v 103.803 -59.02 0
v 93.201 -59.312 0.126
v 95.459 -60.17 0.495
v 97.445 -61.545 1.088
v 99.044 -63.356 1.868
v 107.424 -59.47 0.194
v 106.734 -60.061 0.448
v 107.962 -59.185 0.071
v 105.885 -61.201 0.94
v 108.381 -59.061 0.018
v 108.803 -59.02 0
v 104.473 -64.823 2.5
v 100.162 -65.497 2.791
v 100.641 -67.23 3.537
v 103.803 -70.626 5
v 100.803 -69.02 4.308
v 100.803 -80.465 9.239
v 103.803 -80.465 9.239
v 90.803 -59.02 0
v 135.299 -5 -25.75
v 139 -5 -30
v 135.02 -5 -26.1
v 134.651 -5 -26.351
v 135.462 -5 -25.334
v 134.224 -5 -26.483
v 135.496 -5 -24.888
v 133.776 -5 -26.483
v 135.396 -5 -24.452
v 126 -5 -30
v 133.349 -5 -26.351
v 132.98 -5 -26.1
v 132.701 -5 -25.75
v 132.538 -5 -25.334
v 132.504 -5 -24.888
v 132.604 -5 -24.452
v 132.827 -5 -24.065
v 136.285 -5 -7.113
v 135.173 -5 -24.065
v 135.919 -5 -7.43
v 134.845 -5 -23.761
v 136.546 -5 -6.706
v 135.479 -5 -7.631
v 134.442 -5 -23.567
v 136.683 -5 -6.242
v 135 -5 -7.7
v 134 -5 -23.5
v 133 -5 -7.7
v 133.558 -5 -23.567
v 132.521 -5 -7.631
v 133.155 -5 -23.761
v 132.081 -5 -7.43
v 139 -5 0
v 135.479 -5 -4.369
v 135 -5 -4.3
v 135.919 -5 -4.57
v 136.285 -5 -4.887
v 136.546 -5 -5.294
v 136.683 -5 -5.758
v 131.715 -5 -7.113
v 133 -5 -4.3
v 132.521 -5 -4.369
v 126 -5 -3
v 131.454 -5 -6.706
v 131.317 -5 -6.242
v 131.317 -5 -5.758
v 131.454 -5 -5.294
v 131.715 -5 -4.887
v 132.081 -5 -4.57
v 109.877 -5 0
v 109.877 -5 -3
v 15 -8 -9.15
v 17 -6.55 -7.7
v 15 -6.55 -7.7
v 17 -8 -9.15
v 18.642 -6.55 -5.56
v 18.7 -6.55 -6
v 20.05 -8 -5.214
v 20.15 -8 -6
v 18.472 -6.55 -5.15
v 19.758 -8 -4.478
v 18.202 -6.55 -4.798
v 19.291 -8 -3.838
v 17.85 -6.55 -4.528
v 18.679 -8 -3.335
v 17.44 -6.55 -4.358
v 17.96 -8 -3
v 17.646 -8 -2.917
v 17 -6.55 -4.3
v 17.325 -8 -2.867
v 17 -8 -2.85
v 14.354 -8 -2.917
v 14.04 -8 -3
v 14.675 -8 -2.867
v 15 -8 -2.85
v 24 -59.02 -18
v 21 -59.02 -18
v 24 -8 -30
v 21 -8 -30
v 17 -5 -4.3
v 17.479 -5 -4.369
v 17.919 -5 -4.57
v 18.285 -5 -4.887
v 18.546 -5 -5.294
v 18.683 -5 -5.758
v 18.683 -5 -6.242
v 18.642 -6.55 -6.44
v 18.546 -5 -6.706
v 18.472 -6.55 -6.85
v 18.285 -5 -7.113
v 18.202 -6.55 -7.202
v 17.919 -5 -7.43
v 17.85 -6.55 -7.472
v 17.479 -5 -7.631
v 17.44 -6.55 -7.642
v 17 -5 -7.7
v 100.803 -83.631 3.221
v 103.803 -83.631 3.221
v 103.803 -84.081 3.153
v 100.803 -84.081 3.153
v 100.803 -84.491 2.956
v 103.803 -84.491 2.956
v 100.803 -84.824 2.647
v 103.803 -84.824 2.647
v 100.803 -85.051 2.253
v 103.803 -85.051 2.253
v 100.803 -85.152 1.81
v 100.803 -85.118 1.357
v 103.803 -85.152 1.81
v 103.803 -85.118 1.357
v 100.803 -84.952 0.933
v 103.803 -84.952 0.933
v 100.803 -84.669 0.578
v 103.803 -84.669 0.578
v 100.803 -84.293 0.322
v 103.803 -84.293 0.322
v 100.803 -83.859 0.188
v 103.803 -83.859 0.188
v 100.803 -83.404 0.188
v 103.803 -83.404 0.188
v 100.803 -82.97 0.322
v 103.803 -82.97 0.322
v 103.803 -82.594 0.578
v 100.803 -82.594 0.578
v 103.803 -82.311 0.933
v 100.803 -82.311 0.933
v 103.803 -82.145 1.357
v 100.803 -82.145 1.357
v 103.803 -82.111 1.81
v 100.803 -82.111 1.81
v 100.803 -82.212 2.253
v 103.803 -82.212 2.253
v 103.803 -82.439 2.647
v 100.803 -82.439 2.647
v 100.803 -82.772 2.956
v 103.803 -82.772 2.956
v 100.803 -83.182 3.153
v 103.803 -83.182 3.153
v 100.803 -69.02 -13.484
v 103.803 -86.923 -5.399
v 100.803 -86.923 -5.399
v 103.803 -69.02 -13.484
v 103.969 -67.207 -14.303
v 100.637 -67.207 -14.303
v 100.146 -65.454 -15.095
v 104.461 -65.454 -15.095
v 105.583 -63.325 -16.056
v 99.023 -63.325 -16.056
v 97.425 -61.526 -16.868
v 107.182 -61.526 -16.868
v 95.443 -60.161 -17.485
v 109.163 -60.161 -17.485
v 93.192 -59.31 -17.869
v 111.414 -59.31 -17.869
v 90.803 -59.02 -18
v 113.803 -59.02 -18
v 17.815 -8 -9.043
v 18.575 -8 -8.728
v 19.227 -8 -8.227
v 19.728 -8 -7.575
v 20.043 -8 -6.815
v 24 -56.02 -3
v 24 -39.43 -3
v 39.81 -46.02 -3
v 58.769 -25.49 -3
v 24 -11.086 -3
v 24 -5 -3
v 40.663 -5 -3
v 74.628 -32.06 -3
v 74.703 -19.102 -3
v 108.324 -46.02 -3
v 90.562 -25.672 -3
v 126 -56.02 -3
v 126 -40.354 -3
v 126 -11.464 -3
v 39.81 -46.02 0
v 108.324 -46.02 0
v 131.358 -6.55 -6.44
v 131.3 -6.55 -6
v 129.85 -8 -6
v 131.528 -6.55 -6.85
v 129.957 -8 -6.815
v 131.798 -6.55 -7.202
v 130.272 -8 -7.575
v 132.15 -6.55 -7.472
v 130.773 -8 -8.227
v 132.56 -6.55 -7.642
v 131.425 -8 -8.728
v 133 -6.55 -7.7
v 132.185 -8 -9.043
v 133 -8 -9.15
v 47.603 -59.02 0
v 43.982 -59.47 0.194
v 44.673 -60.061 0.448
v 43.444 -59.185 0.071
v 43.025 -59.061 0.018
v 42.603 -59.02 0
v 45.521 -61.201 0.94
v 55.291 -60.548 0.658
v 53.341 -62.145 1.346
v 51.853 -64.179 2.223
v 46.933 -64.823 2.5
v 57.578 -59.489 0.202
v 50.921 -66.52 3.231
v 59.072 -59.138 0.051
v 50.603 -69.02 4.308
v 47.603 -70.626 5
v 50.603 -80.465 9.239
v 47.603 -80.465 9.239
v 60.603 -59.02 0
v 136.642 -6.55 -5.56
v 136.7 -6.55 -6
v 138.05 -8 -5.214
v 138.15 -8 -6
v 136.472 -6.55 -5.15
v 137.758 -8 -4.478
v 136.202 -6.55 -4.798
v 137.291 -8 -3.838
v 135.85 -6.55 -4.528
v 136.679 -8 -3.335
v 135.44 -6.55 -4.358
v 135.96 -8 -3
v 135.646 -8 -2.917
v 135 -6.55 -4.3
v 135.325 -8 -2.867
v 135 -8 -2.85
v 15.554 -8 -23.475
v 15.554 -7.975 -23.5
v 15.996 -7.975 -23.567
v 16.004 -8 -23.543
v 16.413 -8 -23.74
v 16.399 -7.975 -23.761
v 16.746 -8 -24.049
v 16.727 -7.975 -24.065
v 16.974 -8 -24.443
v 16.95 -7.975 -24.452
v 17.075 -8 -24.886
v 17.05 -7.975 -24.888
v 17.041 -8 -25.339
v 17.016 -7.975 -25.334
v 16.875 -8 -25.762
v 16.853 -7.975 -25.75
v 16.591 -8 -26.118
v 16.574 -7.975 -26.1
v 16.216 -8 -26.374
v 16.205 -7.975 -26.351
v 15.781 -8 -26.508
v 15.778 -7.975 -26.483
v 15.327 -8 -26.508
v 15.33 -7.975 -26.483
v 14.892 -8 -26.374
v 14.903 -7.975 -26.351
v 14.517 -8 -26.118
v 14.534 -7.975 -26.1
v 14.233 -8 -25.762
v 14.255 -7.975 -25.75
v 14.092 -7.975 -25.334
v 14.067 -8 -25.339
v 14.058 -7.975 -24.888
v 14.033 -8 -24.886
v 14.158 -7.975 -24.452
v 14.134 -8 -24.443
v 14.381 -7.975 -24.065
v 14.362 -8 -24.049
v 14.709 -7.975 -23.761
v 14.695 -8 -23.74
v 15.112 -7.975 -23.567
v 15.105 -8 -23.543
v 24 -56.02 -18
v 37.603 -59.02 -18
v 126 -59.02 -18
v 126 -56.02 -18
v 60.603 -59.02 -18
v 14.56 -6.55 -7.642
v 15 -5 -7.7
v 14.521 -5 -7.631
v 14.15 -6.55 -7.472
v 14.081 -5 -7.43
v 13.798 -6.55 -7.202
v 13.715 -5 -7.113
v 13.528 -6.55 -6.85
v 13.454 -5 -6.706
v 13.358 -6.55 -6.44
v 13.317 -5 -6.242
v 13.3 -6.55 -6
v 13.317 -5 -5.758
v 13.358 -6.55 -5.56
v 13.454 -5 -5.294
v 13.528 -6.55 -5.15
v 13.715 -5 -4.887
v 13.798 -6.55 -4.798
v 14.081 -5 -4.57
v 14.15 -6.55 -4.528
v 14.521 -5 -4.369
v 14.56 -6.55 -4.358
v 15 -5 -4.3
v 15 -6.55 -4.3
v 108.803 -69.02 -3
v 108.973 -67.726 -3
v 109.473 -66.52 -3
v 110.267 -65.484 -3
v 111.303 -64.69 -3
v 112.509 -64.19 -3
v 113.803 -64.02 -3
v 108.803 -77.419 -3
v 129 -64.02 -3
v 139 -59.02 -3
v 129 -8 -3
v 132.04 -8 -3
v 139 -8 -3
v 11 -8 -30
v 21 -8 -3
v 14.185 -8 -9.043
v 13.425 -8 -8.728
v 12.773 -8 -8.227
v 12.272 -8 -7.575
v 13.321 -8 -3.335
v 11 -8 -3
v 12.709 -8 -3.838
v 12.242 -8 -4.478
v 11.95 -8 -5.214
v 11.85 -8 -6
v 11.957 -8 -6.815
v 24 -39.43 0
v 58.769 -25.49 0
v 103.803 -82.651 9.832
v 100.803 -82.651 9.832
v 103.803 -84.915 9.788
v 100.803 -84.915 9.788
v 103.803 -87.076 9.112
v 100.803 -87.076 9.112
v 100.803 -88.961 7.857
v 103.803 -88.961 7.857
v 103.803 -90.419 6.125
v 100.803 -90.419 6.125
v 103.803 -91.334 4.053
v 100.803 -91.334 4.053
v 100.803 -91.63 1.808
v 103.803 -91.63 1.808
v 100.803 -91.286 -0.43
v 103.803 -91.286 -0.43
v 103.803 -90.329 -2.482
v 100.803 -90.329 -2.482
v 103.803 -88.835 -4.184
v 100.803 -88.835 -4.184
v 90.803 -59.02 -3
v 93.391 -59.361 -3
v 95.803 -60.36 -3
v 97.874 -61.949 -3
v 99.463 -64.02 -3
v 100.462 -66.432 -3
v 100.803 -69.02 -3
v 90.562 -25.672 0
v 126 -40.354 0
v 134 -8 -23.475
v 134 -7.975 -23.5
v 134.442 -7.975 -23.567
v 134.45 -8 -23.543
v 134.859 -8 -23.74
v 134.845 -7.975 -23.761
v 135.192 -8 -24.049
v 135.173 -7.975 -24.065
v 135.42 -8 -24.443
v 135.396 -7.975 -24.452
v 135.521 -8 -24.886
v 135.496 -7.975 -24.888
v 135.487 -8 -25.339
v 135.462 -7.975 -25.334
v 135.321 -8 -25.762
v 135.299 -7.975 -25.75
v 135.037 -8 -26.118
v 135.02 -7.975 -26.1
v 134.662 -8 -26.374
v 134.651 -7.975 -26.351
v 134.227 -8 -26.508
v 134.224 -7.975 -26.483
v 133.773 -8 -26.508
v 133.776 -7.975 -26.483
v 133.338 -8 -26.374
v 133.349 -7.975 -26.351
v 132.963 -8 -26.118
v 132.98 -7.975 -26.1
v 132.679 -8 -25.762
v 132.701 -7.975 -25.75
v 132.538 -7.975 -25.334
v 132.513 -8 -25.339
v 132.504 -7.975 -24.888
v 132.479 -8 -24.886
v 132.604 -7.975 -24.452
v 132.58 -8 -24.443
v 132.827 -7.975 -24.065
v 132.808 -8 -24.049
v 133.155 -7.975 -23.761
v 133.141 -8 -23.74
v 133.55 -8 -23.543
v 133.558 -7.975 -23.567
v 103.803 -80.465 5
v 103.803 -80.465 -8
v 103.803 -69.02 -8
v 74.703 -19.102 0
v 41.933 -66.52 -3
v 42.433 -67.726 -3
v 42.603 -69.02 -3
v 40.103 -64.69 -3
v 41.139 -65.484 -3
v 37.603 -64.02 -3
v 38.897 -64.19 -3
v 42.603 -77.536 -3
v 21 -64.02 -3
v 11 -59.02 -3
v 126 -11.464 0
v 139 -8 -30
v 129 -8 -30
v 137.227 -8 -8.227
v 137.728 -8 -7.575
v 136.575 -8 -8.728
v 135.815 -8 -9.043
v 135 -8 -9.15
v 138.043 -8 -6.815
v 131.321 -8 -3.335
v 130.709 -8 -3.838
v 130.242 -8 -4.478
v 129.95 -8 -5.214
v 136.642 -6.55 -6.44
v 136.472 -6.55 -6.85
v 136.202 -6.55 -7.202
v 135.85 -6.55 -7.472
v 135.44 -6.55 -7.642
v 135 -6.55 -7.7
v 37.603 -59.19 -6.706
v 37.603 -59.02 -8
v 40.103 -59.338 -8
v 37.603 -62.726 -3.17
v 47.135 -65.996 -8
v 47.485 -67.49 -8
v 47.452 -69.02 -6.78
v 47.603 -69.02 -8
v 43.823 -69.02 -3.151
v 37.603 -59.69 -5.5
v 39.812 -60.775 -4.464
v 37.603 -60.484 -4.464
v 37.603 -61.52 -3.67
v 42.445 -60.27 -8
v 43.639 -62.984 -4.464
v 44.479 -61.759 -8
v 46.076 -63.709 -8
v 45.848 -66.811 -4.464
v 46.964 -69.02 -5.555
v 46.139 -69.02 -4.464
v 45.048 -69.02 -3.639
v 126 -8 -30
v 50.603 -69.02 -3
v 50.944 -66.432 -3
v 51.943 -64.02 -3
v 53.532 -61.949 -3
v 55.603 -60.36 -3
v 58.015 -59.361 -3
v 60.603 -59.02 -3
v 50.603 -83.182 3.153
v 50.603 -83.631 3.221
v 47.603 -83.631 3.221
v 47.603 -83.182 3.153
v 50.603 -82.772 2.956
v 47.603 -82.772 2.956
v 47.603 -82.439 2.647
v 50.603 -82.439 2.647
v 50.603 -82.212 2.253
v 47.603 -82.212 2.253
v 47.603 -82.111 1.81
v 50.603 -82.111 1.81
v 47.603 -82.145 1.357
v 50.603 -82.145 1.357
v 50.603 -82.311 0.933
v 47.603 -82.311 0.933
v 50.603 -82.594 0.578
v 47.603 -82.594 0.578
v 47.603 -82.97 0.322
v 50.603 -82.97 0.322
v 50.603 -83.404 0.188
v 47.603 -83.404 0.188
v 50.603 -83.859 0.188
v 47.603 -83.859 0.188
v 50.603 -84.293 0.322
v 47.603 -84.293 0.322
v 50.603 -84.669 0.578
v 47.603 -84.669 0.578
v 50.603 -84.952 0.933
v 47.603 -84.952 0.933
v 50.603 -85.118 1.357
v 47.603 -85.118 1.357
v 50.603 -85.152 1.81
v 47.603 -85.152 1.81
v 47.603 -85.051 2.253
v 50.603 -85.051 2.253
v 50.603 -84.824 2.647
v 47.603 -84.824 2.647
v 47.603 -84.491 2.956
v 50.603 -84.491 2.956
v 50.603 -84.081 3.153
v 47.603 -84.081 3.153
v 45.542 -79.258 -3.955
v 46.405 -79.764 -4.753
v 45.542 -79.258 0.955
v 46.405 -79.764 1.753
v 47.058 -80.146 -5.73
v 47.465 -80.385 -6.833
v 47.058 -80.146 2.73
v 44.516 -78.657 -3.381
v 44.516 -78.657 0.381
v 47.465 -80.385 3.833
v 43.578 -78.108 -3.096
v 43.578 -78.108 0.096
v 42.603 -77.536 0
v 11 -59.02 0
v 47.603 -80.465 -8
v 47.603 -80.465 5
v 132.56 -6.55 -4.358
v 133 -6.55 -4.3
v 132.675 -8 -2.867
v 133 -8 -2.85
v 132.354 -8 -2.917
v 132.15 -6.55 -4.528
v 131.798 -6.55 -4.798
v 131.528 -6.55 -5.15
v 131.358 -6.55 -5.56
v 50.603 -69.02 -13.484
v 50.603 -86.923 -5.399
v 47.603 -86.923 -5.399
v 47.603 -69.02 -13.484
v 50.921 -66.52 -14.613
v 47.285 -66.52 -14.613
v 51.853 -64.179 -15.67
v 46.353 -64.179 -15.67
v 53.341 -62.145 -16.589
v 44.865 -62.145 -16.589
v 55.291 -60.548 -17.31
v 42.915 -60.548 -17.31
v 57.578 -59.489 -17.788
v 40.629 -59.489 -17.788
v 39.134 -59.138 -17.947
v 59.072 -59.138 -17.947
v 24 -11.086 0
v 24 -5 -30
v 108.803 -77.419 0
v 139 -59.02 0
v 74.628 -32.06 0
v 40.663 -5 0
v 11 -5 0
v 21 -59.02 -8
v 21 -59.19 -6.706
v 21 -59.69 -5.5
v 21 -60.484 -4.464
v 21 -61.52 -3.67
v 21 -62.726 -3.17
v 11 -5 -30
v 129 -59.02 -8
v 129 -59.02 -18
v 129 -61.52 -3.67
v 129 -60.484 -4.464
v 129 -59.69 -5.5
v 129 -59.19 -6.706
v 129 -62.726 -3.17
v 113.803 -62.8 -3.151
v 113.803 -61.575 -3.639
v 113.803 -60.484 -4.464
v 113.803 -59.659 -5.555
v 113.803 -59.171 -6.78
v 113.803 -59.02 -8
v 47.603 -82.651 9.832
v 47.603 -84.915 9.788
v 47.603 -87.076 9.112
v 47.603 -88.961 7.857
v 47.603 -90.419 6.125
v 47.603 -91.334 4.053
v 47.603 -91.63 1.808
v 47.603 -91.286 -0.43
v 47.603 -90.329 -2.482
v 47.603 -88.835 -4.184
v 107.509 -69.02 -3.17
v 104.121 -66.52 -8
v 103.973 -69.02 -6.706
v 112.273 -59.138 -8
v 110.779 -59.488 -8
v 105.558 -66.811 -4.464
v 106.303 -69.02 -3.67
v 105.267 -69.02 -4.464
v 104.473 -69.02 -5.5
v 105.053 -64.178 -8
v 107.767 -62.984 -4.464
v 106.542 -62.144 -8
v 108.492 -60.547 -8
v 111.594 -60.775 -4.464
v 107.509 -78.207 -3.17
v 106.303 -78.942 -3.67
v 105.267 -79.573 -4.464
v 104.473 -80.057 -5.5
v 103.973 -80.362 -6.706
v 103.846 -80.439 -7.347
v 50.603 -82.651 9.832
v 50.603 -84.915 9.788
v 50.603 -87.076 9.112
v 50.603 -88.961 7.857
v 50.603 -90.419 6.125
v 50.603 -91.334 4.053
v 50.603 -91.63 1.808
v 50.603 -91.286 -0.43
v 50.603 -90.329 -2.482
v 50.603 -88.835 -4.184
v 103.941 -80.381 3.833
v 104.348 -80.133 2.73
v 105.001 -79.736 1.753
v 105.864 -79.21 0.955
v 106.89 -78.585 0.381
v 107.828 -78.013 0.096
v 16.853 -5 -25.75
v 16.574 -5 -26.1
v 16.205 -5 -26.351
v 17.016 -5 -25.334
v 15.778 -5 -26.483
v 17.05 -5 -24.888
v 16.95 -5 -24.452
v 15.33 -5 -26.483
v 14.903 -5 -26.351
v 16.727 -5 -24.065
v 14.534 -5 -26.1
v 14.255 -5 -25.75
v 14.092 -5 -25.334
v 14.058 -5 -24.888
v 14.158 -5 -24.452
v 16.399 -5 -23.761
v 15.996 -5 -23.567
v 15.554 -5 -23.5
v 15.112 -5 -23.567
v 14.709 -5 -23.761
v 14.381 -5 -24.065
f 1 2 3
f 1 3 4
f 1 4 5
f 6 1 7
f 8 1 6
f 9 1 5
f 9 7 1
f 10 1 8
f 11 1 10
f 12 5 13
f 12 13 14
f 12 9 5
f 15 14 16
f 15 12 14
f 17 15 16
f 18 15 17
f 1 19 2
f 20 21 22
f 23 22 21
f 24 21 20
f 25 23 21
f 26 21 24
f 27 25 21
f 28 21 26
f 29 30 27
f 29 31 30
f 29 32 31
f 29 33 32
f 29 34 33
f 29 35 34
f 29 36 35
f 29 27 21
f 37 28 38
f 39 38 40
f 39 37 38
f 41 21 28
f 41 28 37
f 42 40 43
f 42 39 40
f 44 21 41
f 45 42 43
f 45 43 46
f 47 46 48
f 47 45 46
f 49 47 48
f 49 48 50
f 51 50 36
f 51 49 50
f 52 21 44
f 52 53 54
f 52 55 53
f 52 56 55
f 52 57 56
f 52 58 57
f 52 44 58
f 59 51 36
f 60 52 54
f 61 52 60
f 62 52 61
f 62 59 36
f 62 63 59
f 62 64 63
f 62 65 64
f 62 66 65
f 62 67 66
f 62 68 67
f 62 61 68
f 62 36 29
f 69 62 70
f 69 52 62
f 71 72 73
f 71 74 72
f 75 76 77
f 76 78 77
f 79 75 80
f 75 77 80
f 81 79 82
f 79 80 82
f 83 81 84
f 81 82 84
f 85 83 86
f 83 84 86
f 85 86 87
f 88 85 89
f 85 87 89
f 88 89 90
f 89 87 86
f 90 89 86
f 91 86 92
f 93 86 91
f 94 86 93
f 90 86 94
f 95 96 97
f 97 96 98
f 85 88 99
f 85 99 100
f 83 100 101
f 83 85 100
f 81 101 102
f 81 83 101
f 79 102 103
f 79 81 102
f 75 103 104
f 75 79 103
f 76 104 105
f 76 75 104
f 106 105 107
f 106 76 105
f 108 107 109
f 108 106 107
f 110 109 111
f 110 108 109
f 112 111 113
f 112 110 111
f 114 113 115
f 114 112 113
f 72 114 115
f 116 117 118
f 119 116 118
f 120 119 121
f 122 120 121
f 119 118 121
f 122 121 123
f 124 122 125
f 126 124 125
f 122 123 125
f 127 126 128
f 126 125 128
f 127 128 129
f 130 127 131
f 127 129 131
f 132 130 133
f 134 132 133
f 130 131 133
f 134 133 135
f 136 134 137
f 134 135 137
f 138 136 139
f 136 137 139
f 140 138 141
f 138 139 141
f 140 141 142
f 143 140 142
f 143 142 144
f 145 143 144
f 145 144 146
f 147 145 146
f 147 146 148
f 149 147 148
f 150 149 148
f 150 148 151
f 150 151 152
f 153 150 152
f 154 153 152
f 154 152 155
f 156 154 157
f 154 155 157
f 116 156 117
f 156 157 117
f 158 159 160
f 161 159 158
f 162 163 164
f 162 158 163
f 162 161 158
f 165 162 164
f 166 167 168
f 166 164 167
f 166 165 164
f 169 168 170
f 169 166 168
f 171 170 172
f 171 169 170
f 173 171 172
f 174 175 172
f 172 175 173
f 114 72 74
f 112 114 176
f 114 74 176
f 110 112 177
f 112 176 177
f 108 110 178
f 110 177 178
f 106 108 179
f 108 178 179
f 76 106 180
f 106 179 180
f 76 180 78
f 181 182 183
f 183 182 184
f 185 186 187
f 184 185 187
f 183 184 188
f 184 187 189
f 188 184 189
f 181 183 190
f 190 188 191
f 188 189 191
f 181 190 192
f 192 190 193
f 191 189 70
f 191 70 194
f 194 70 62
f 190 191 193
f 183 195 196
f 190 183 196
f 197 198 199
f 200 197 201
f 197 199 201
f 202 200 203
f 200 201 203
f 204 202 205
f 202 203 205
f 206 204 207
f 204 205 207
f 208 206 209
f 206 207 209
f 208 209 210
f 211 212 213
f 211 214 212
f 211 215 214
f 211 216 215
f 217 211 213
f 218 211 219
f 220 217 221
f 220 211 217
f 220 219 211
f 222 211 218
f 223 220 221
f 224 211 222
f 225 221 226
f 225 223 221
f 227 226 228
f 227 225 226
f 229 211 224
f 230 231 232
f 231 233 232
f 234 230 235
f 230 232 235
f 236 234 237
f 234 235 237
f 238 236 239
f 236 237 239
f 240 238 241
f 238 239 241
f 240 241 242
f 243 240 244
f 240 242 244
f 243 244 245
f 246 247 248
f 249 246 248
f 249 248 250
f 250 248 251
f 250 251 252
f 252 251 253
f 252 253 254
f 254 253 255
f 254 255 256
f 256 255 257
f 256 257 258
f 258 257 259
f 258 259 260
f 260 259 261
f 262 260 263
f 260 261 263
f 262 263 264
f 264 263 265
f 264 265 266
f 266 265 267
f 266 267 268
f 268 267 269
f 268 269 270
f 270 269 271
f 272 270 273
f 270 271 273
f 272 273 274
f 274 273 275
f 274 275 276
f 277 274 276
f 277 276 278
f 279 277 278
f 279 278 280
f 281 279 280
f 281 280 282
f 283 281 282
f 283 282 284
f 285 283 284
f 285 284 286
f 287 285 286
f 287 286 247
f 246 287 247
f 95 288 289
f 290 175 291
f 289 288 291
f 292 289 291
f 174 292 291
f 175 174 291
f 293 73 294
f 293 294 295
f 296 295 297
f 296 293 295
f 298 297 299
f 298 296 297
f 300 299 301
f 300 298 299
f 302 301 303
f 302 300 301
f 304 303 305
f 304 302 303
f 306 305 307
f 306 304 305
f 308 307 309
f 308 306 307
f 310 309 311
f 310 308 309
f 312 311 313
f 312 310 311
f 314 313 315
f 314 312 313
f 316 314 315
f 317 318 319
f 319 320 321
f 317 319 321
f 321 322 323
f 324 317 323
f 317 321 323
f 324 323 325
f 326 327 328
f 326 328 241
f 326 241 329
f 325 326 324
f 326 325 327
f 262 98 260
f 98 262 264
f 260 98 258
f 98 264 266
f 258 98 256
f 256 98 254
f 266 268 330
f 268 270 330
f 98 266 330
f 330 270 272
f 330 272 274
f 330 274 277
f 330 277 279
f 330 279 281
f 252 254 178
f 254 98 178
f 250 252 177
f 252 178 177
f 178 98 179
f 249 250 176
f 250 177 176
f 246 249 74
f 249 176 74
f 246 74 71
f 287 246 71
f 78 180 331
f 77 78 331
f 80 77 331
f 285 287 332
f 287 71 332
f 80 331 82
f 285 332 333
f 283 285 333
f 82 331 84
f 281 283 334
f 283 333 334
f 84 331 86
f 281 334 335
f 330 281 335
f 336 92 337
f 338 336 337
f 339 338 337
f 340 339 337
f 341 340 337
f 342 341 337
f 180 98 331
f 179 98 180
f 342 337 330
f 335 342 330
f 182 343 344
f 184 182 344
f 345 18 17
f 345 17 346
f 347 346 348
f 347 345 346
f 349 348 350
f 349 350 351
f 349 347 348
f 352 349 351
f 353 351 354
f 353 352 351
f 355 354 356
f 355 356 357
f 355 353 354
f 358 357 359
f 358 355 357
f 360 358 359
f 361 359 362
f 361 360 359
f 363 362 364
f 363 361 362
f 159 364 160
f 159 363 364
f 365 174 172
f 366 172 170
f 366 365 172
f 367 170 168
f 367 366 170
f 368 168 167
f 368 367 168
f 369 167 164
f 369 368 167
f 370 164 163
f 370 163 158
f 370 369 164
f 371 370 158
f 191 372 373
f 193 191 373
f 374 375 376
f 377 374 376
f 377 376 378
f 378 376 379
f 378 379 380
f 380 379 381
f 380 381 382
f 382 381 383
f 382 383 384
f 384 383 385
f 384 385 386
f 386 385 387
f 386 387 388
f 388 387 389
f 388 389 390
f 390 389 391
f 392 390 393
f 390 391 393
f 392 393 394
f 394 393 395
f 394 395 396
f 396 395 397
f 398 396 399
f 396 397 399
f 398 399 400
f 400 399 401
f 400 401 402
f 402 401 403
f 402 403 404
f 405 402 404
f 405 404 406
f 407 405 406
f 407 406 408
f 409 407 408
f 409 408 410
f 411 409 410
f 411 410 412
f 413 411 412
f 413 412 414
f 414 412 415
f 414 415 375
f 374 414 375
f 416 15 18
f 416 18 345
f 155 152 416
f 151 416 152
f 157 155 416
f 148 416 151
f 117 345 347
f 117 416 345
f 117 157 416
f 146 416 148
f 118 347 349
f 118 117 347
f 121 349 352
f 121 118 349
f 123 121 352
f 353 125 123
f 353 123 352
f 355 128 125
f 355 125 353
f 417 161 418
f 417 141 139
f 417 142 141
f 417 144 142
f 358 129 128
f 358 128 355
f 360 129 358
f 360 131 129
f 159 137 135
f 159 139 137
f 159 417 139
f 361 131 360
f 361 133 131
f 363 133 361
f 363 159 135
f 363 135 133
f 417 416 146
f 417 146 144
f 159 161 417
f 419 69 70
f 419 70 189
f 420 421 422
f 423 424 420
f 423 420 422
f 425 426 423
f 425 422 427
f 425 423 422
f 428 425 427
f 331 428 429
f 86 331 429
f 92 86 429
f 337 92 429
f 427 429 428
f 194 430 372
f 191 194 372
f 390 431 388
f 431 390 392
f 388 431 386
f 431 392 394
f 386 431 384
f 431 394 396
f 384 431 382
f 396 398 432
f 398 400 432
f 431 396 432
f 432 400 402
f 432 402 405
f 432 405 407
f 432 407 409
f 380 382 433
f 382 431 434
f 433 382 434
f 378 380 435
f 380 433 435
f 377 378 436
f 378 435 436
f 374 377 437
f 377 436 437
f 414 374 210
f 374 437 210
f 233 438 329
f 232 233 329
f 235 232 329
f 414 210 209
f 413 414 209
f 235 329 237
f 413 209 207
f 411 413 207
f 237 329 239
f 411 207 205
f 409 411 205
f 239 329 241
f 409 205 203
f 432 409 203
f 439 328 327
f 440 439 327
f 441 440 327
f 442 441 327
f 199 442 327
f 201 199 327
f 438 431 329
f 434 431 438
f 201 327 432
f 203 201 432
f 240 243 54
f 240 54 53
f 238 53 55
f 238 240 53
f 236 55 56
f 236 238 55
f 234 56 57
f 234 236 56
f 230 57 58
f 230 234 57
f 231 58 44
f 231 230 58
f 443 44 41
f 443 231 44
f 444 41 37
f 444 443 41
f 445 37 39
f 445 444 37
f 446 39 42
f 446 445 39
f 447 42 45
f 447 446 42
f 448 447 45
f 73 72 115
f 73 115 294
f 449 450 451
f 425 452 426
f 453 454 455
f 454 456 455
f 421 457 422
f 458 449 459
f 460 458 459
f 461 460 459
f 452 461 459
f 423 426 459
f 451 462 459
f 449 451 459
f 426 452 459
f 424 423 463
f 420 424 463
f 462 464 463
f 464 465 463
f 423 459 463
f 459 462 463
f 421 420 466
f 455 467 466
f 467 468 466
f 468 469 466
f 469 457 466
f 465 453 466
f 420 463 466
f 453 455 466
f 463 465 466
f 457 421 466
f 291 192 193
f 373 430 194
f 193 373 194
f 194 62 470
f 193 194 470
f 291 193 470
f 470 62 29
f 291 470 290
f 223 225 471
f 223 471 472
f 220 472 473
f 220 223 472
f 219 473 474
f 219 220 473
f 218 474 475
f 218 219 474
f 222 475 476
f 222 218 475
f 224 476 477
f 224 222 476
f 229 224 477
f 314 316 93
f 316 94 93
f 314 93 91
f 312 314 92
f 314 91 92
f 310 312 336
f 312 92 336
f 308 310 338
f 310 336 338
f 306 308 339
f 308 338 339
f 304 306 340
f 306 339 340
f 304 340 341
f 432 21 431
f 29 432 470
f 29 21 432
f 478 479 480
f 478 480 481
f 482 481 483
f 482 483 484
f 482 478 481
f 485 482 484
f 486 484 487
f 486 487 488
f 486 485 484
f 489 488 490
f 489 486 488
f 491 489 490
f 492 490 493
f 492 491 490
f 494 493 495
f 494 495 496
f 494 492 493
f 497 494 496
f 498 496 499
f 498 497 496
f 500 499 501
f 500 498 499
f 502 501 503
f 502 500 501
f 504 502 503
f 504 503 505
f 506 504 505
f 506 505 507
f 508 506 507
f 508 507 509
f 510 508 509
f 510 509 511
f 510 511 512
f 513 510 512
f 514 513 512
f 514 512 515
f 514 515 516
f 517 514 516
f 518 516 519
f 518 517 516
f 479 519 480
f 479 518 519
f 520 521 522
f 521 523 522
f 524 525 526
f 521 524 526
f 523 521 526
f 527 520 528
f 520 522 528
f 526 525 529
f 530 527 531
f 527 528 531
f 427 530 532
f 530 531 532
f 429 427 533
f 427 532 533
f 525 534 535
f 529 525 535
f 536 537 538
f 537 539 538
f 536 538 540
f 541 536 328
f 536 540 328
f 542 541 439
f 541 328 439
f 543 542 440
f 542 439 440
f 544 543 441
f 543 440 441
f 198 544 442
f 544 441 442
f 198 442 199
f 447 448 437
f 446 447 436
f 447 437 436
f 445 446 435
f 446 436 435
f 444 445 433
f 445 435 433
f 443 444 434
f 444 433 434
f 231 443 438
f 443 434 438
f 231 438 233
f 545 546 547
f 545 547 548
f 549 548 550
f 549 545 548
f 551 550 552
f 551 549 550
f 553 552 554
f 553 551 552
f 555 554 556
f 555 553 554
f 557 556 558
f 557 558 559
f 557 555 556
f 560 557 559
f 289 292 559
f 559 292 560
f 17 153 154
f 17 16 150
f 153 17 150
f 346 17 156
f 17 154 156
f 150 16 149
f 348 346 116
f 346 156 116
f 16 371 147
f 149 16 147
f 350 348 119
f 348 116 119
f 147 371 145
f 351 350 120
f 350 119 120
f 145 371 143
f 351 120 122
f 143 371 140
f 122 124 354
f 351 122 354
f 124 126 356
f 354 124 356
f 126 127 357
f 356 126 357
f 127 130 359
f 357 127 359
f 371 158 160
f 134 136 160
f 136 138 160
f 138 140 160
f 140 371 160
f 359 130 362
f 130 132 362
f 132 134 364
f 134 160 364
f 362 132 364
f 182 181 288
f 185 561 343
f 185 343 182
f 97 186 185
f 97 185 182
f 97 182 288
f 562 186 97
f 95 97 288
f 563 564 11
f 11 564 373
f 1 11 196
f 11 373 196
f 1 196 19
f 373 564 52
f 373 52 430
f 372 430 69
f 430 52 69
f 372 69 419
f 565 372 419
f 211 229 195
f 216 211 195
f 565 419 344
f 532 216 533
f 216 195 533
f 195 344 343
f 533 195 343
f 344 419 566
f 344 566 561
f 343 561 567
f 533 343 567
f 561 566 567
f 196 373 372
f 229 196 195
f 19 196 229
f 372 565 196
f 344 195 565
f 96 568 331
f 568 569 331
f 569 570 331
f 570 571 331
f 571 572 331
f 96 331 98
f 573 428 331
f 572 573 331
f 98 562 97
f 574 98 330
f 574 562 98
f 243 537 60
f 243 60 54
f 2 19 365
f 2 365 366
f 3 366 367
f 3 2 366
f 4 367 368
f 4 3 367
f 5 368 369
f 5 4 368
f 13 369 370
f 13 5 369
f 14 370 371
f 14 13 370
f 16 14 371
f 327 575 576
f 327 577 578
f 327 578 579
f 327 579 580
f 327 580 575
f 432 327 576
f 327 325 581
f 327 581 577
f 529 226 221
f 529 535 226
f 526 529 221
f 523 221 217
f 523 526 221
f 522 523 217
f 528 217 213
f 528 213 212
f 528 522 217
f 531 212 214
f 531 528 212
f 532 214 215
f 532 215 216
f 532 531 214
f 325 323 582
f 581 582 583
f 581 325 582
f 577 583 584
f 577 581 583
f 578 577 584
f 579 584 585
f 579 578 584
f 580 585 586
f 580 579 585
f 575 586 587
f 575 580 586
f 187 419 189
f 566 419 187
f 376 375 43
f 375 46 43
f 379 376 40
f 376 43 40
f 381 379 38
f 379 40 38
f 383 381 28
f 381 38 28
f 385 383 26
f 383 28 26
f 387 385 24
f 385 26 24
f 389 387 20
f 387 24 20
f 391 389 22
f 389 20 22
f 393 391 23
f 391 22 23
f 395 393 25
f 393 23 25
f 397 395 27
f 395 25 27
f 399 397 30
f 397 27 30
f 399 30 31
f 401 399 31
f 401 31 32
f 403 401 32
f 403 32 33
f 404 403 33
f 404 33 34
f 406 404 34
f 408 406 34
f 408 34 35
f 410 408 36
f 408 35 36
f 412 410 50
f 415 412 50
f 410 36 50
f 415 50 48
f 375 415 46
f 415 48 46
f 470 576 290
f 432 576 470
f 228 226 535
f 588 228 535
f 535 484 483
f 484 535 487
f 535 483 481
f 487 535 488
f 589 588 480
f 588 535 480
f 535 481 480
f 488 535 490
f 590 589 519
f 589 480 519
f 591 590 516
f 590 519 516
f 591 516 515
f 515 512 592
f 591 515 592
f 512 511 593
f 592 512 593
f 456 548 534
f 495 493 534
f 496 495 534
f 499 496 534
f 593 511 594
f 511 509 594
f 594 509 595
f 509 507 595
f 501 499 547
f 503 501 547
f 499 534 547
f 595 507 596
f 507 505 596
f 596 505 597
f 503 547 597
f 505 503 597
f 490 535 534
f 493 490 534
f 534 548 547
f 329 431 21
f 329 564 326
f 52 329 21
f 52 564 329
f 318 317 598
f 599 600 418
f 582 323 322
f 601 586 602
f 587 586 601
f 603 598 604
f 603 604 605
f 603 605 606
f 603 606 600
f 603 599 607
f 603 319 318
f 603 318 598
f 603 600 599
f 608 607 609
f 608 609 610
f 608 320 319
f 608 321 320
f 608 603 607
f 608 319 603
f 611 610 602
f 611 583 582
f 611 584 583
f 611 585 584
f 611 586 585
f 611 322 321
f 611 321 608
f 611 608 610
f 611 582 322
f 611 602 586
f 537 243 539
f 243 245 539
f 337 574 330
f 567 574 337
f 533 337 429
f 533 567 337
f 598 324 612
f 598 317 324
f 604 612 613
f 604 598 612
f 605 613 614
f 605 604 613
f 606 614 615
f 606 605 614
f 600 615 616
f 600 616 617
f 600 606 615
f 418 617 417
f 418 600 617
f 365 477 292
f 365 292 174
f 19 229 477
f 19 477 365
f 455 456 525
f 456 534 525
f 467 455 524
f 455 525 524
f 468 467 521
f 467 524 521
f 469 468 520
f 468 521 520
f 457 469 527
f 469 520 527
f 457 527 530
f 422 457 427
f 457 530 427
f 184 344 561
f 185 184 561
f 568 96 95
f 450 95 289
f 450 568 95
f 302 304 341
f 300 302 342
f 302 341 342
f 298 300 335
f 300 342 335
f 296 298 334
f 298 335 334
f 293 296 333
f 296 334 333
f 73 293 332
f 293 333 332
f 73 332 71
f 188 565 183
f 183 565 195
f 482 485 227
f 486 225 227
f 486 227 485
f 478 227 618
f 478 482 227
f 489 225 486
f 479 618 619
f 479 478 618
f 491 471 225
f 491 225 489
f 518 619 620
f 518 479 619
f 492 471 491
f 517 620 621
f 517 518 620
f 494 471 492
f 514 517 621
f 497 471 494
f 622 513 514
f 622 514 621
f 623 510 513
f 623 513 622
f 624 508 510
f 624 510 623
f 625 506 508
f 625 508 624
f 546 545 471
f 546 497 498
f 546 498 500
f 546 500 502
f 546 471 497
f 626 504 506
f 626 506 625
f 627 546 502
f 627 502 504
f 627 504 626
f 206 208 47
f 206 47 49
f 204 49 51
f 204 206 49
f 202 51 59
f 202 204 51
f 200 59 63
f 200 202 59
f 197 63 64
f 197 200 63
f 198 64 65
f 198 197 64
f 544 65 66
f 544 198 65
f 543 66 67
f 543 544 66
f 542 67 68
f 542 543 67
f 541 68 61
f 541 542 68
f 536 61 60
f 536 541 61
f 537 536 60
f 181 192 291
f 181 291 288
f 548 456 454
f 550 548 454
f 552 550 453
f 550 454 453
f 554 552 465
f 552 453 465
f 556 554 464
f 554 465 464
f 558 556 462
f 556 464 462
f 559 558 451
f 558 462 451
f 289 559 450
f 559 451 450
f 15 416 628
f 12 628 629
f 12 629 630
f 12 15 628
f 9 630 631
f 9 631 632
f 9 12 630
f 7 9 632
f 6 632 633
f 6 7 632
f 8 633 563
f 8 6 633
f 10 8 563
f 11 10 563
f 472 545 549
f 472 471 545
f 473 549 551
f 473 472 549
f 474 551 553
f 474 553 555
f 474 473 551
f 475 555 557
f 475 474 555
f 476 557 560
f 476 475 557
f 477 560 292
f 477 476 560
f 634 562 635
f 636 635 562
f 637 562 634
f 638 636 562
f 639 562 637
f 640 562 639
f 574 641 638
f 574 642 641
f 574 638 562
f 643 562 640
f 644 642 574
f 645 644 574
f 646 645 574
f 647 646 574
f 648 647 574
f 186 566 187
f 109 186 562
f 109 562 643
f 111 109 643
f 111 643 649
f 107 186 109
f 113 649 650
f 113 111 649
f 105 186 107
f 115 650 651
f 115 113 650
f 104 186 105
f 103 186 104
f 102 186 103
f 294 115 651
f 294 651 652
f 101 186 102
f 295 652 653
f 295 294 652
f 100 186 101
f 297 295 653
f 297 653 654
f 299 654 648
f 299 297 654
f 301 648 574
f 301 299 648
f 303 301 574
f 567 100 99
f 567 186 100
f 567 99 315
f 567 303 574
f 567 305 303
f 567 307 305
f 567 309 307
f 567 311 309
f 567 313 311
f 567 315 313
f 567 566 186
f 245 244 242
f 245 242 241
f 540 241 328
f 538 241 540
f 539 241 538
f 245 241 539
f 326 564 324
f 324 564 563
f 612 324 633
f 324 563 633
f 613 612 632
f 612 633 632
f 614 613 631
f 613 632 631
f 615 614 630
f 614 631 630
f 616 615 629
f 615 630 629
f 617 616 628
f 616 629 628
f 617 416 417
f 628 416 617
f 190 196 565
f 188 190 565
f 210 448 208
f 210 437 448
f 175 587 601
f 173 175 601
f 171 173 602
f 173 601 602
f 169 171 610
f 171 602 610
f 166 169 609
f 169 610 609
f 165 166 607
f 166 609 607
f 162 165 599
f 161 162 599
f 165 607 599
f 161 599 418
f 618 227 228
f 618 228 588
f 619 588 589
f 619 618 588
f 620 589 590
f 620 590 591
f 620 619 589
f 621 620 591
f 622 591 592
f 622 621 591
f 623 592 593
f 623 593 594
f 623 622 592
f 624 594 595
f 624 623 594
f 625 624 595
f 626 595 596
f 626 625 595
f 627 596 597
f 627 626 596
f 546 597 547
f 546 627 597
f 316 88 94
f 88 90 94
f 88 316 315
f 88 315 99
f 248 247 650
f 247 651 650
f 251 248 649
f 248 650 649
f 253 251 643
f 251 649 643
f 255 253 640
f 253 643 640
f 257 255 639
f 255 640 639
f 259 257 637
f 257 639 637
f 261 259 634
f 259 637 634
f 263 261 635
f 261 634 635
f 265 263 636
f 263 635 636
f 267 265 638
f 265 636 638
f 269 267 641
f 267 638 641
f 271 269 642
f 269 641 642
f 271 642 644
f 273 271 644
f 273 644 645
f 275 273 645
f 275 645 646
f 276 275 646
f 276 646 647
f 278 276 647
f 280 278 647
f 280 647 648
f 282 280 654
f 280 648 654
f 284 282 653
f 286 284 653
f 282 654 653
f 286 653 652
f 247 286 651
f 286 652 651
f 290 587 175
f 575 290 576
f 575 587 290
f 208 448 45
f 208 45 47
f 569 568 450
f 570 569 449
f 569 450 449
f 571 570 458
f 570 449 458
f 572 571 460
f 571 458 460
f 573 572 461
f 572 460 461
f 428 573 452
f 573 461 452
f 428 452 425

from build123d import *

# Parameters (mm, degrees)
BOSS_EXTRUDE1_DEPTH                            = 3
BOSS_EXTRUDE2_DEPTH                            = 15
SKETCH4_W                                      = 13
SKETCH4_H                                      = 3
BOSS_EXTRUDE3_DEPTH                            = 12
BOSS_EXTRUDE4_DEPTH                            = 3
BOSS_EXTRUDE5_DEPTH                            = 3
SKETCH7_R                                      = 1.525
BOSS_EXTRUDE6_DEPTH                            = 3
BOSS_EXTRUDE7_START                            = 3
SKETCH8_R                                      = 1.525
BOSS_EXTRUDE7_DEPTH                            = 3
BOSS_EXTRUDE8_DEPTH                            = 3
FILLET2_R                                      = 10
FILLET3_R                                      = 5
CSK_START                                      = -8
CSK_SLOT_FOR_M3_FLAT_HEAD_MACHINE_SCREW1_DEPTH = 3
F_3_0MM_DOWEL_HOLE2_D                          = 3
F_3_0MM_DOWEL_HOLE2_DEPTH                      = 7.5
F_3_0MM_DOWEL_HOLE2_CSINK_D                    = 3.05
F_3_0MM_DOWEL_HOLE2_CSINK_ANGLE                = 90
F_3_0MM_DOWEL_HOLE2_TIP                        = 0.901290929


with BuildPart() as part:
    # Sketch1 → Boss-Extrude1 (new body)
    with BuildSketch(Plane.XY):
        Polygon((139, -5), (109.876604516, -5), (74.70251528, -19.102143128), (40.663008058, -5), (11, -5), (11, -59.019998994), (139, -59.019998994), align=None)
        Polygon((126, -11.464259225), (90.561608439, -25.672367549), (126, -40.354051004), align=None, mode=Mode.SUBTRACT)
        Polygon((24, -11.085769738), (24, -39.430007843), (58.769174389, -25.49020487), align=None, mode=Mode.SUBTRACT)
        Polygon((39.809790244, -46.019998994), (108.323633524, -46.019998994), (74.628267548, -32.06042929), align=None, mode=Mode.SUBTRACT)
    extrude(amount=-BOSS_EXTRUDE1_DEPTH)

    # Sketch3 → Boss-Extrude2 (add)
    with BuildSketch(Plane(origin=(0, 0, -3), x_dir=(-1, 0, 0), z_dir=(0, 0, -1))):
        Polygon((-139, -8), (-139, -5), (-126, -5), (-126, -56.019998994), (-24, -56.019998994), (-24, -5), (-11, -5), (-11, -8), (-21, -8), (-21, -59.019998994), (-129, -59.019998994), (-129, -8), align=None)
    extrude(amount=BOSS_EXTRUDE2_DEPTH)

    # Sketch4 → Boss-Extrude3 (add)
    with BuildSketch(Plane(origin=(0, 0, -18), x_dir=(-1, 0, 0), z_dir=(0, 0, -1))):
        with Locations((-132.5, -6.5)):
            Rectangle(SKETCH4_W, SKETCH4_H)
        with Locations((-17.5, -6.5)):
            Rectangle(SKETCH4_W, SKETCH4_H)
    extrude(amount=BOSS_EXTRUDE3_DEPTH)

    # Sketch5 → Boss-Extrude4 (add)
    with BuildSketch(Plane.ZY.offset(-21)):
        Polygon((-30, -8), (-18, -8), (-18, -59.019998994), align=None)
    extrude(amount=-BOSS_EXTRUDE4_DEPTH)

    # Sketch6 → Boss-Extrude5 (add)
    with BuildSketch(Plane(origin=(129, 0, 0), x_dir=(0, 0, -1), z_dir=(1, 0, 0))):
        Polygon((18, -8), (18, -59.019998994), (30, -8), align=None)
    extrude(amount=-BOSS_EXTRUDE5_DEPTH)

    # Sketch7 → Boss-Extrude6 (add)
    with BuildSketch(Plane(origin=(50.603026188, 28.677278628, 20.937913876), x_dir=(0, 0.9992078437352027, -0.039795540177848664), z_dir=(-1, 0, 0))):
        with BuildLine():
            Line((-86.078252358, 42.397029499), (-86.675185461, 27.408911843))
            Line((-86.675185461, 27.408911843), (-86.794572081, 24.411288312))
            Line((-86.794572081, 24.411288312), (-108.590752447, 16.032710832))
            ThreePointArc((-108.590752447, 16.032710832), (-118.903275809, 20.564727028), (-114.461076578, 30.916257103))
            Line((-114.461076578, 30.916257103), (-86.078252358, 42.397029499))
        make_face()
        with Locations(Location((-111.454014111, 23.696060126, 0), (0, 0, 267.719281244))):
            Circle(SKETCH7_R, mode=Mode.SUBTRACT)
    extrude(amount=BOSS_EXTRUDE6_DEPTH)

    # Sketch8 → Boss-Extrude7 (add)
    with BuildSketch(Plane(origin=(100.803026188, 28.677278628, 20.937913876), x_dir=(0, -0.9992078437352027, 0.039795540177848664), z_dir=(1, 0, 0)).offset(BOSS_EXTRUDE7_START)):
        with BuildLine():
            Line((86.078252358, 42.397029499), (86.675185461, 27.408911843))
            Line((86.675185461, 27.408911843), (86.794572081, 24.411288312))
            Line((86.794572081, 24.411288312), (108.590752447, 16.032710832))
            ThreePointArc((108.590752447, 16.032710832), (118.903275809, 20.564727028), (114.461076578, 30.916257103))
            Line((114.461076578, 30.916257103), (86.078252358, 42.397029499))
        make_face()
        with Locations(Location((111.454014111, 23.696060126, 0), (0, 0, 272.280718756))):
            Circle(SKETCH8_R, mode=Mode.SUBTRACT)
    extrude(amount=-BOSS_EXTRUDE7_DEPTH)

    # Sketch9 → Boss-Extrude8 (add)
    with BuildSketch(Plane.XY):
        Polygon((11, -59.019998994), (47.603026188, -59.019998994), (47.603026188, -80.465483362), align=None)
        Polygon((103.803026188, -59.019998994), (139, -59.019998994), (103.803026188, -80.465483362), align=None)
    extrude(amount=-BOSS_EXTRUDE8_DEPTH)

    # Fillet2
    fillet2_edges = [part.edges().sort_by_distance(p)[0] for p in [
        (50.603026188, -59.019998994, -9),
        (103.803026188, -59.019998994, -10.5),
        (100.803026188, -59.019998994, -9),
        (47.603026188, -59.019998994, -10.5),
    ]]
    fillet(fillet2_edges, radius=FILLET2_R)

    # Fillet3
    fillet3_edges = [part.edges().sort_by_distance(p)[0] for p in [
        (47.603026188, -69.742741178, 0),
        (29.301513094, -59.019998994, -3),
        (103.803026188, -69.742741178, 0),
        (103.803026188, -74.742741178, -3),
        (121.401513094, -59.019998994, -3),
        (106.731958376, -61.948931182, -3),
        (47.603026188, -74.742741178, -3),
        (44.674094, -61.948931182, -3),
    ]]
    fillet(fillet3_edges, radius=FILLET3_R)

    # CSK SLOT for M3 Flat Head Machine Screw1: read off the stored shape, not the designer's step
    # CSK SLOT for M3 Flat Head Machine Sc 2 → CSK SLOT for M3 Flat Head Machine Screw1 (cut)
    with BuildSketch(Plane(origin=(0, 0, 0), x_dir=(1, 0, 0), z_dir=(0, 1, 0)).offset(CSK_START)):
        with BuildLine():
            ThreePointArc((17, 4.3), (18.7, 6), (17, 7.7))
            Line((17, 7.7), (15, 7.7))
            ThreePointArc((15, 7.7), (13.3, 6), (15, 4.3))
            Line((15, 4.3), (17, 4.3))
        make_face()
        with BuildLine():
            ThreePointArc((133, 7.7), (131.3, 6), (133, 4.3))
            Line((133, 4.3), (135, 4.3))
            ThreePointArc((135, 4.3), (136.7, 6), (135, 7.7))
            Line((135, 7.7), (133, 7.7))
        make_face()
    extrude(amount=CSK_SLOT_FOR_M3_FLAT_HEAD_MACHINE_SCREW1_DEPTH, mode=Mode.SUBTRACT)

    # CSK SLOT for M3 Flat Head Machine Sc 3: loft between two sections, ruled curve by curve
    csk_slot_for_m3_flat_head_machine_sc_3_from = [
        Edge.make_three_point_arc((17, -6.55, -7.7), (18.202081528, -6.55, -7.202081528), (18.7, -6.55, -6)),
        Edge.make_three_point_arc((18.7, -6.55, -6), (18.202081528, -6.55, -4.797918472), (17, -6.55, -4.3)),
        Edge.make_three_point_arc((15, -6.55, -4.3), (13.797918472, -6.55, -4.797918472), (13.3, -6.55, -6)),
        Edge.make_three_point_arc((13.3, -6.55, -6), (13.797918472, -6.55, -7.202081528), (15, -6.55, -7.7)),
        Edge.make_line((17, -6.55, -4.3), (15, -6.55, -4.3)),
        Edge.make_line((17, -6.55, -7.7), (15, -6.55, -7.7)),
    ]
    csk_slot_for_m3_flat_head_machine_sc_3_to = [
        Edge.make_three_point_arc((17, -8, -9.15), (19.227386361, -8, -8.227386361), (20.15, -8, -6)),
        Edge.make_three_point_arc((20.15, -8, -6), (19.227386361, -8, -3.772613639), (17, -8, -2.85)),
        Edge.make_three_point_arc((15, -8, -2.85), (12.772613639, -8, -3.772613639), (11.85, -8, -6)),
        Edge.make_three_point_arc((11.85, -8, -6), (12.772613639, -8, -8.227386361), (15, -8, -9.15)),
        Edge.make_line((17, -8, -2.85), (15, -8, -2.85)),
        Edge.make_line((17, -8, -9.15), (15, -8, -9.15)),
    ]
    csk_slot_for_m3_flat_head_machine_sc_3 = Solid(Shell([*[Face.make_surface_from_curves(csk_slot_for_m3_flat_head_machine_sc_3_from[k], csk_slot_for_m3_flat_head_machine_sc_3_to[k]) for k in range(6)], Face(Wire(csk_slot_for_m3_flat_head_machine_sc_3_from)), Face(Wire(csk_slot_for_m3_flat_head_machine_sc_3_to))]))
    add(csk_slot_for_m3_flat_head_machine_sc_3, mode=Mode.SUBTRACT)

    # CSK SLOT for M3 Flat Head Machine Sc 4: loft between two sections, ruled curve by curve
    csk_slot_for_m3_flat_head_machine_sc_4_from = [
        Edge.make_three_point_arc((135, -6.55, -7.7), (136.202081528, -6.55, -7.202081528), (136.7, -6.55, -6)),
        Edge.make_three_point_arc((136.7, -6.55, -6), (136.202081528, -6.55, -4.797918472), (135, -6.55, -4.3)),
        Edge.make_three_point_arc((133, -6.55, -4.3), (131.797918472, -6.55, -4.797918472), (131.3, -6.55, -6)),
        Edge.make_three_point_arc((131.3, -6.55, -6), (131.797918472, -6.55, -7.202081528), (133, -6.55, -7.7)),
        Edge.make_line((135, -6.55, -4.3), (133, -6.55, -4.3)),
        Edge.make_line((135, -6.55, -7.7), (133, -6.55, -7.7)),
    ]
    csk_slot_for_m3_flat_head_machine_sc_4_to = [
        Edge.make_three_point_arc((135, -8, -9.15), (137.227386361, -8, -8.227386361), (138.15, -8, -6)),
        Edge.make_three_point_arc((138.15, -8, -6), (137.227386361, -8, -3.772613639), (135, -8, -2.85)),
        Edge.make_three_point_arc((133, -8, -2.85), (130.772613639, -8, -3.772613639), (129.85, -8, -6)),
        Edge.make_three_point_arc((129.85, -8, -6), (130.772613639, -8, -8.227386361), (133, -8, -9.15)),
        Edge.make_line((135, -8, -2.85), (133, -8, -2.85)),
        Edge.make_line((135, -8, -9.15), (133, -8, -9.15)),
    ]
    csk_slot_for_m3_flat_head_machine_sc_4 = Solid(Shell([*[Face.make_surface_from_curves(csk_slot_for_m3_flat_head_machine_sc_4_from[k], csk_slot_for_m3_flat_head_machine_sc_4_to[k]) for k in range(6)], Face(Wire(csk_slot_for_m3_flat_head_machine_sc_4_from)), Face(Wire(csk_slot_for_m3_flat_head_machine_sc_4_to))]))
    add(csk_slot_for_m3_flat_head_machine_sc_4, mode=Mode.SUBTRACT)

    # Ø3.0mm Dowel Hole2
    with Locations(Plane(origin=(134, -8, -25), x_dir=(0, 0, -1), z_dir=(0, -1, 0))):
        with Locations((0, 0), (0, -118.445937781)):
            CounterSinkHole(F_3_0MM_DOWEL_HOLE2_D / 2, F_3_0MM_DOWEL_HOLE2_CSINK_D / 2, depth=F_3_0MM_DOWEL_HOLE2_DEPTH, counter_sink_angle=F_3_0MM_DOWEL_HOLE2_CSINK_ANGLE)
            with Locations((0, 0, -(F_3_0MM_DOWEL_HOLE2_DEPTH + F_3_0MM_DOWEL_HOLE2_TIP / 2))):  # 118° drill point
                Cone(0, F_3_0MM_DOWEL_HOLE2_D / 2, F_3_0MM_DOWEL_HOLE2_TIP, mode=Mode.SUBTRACT)


solid = part.part
